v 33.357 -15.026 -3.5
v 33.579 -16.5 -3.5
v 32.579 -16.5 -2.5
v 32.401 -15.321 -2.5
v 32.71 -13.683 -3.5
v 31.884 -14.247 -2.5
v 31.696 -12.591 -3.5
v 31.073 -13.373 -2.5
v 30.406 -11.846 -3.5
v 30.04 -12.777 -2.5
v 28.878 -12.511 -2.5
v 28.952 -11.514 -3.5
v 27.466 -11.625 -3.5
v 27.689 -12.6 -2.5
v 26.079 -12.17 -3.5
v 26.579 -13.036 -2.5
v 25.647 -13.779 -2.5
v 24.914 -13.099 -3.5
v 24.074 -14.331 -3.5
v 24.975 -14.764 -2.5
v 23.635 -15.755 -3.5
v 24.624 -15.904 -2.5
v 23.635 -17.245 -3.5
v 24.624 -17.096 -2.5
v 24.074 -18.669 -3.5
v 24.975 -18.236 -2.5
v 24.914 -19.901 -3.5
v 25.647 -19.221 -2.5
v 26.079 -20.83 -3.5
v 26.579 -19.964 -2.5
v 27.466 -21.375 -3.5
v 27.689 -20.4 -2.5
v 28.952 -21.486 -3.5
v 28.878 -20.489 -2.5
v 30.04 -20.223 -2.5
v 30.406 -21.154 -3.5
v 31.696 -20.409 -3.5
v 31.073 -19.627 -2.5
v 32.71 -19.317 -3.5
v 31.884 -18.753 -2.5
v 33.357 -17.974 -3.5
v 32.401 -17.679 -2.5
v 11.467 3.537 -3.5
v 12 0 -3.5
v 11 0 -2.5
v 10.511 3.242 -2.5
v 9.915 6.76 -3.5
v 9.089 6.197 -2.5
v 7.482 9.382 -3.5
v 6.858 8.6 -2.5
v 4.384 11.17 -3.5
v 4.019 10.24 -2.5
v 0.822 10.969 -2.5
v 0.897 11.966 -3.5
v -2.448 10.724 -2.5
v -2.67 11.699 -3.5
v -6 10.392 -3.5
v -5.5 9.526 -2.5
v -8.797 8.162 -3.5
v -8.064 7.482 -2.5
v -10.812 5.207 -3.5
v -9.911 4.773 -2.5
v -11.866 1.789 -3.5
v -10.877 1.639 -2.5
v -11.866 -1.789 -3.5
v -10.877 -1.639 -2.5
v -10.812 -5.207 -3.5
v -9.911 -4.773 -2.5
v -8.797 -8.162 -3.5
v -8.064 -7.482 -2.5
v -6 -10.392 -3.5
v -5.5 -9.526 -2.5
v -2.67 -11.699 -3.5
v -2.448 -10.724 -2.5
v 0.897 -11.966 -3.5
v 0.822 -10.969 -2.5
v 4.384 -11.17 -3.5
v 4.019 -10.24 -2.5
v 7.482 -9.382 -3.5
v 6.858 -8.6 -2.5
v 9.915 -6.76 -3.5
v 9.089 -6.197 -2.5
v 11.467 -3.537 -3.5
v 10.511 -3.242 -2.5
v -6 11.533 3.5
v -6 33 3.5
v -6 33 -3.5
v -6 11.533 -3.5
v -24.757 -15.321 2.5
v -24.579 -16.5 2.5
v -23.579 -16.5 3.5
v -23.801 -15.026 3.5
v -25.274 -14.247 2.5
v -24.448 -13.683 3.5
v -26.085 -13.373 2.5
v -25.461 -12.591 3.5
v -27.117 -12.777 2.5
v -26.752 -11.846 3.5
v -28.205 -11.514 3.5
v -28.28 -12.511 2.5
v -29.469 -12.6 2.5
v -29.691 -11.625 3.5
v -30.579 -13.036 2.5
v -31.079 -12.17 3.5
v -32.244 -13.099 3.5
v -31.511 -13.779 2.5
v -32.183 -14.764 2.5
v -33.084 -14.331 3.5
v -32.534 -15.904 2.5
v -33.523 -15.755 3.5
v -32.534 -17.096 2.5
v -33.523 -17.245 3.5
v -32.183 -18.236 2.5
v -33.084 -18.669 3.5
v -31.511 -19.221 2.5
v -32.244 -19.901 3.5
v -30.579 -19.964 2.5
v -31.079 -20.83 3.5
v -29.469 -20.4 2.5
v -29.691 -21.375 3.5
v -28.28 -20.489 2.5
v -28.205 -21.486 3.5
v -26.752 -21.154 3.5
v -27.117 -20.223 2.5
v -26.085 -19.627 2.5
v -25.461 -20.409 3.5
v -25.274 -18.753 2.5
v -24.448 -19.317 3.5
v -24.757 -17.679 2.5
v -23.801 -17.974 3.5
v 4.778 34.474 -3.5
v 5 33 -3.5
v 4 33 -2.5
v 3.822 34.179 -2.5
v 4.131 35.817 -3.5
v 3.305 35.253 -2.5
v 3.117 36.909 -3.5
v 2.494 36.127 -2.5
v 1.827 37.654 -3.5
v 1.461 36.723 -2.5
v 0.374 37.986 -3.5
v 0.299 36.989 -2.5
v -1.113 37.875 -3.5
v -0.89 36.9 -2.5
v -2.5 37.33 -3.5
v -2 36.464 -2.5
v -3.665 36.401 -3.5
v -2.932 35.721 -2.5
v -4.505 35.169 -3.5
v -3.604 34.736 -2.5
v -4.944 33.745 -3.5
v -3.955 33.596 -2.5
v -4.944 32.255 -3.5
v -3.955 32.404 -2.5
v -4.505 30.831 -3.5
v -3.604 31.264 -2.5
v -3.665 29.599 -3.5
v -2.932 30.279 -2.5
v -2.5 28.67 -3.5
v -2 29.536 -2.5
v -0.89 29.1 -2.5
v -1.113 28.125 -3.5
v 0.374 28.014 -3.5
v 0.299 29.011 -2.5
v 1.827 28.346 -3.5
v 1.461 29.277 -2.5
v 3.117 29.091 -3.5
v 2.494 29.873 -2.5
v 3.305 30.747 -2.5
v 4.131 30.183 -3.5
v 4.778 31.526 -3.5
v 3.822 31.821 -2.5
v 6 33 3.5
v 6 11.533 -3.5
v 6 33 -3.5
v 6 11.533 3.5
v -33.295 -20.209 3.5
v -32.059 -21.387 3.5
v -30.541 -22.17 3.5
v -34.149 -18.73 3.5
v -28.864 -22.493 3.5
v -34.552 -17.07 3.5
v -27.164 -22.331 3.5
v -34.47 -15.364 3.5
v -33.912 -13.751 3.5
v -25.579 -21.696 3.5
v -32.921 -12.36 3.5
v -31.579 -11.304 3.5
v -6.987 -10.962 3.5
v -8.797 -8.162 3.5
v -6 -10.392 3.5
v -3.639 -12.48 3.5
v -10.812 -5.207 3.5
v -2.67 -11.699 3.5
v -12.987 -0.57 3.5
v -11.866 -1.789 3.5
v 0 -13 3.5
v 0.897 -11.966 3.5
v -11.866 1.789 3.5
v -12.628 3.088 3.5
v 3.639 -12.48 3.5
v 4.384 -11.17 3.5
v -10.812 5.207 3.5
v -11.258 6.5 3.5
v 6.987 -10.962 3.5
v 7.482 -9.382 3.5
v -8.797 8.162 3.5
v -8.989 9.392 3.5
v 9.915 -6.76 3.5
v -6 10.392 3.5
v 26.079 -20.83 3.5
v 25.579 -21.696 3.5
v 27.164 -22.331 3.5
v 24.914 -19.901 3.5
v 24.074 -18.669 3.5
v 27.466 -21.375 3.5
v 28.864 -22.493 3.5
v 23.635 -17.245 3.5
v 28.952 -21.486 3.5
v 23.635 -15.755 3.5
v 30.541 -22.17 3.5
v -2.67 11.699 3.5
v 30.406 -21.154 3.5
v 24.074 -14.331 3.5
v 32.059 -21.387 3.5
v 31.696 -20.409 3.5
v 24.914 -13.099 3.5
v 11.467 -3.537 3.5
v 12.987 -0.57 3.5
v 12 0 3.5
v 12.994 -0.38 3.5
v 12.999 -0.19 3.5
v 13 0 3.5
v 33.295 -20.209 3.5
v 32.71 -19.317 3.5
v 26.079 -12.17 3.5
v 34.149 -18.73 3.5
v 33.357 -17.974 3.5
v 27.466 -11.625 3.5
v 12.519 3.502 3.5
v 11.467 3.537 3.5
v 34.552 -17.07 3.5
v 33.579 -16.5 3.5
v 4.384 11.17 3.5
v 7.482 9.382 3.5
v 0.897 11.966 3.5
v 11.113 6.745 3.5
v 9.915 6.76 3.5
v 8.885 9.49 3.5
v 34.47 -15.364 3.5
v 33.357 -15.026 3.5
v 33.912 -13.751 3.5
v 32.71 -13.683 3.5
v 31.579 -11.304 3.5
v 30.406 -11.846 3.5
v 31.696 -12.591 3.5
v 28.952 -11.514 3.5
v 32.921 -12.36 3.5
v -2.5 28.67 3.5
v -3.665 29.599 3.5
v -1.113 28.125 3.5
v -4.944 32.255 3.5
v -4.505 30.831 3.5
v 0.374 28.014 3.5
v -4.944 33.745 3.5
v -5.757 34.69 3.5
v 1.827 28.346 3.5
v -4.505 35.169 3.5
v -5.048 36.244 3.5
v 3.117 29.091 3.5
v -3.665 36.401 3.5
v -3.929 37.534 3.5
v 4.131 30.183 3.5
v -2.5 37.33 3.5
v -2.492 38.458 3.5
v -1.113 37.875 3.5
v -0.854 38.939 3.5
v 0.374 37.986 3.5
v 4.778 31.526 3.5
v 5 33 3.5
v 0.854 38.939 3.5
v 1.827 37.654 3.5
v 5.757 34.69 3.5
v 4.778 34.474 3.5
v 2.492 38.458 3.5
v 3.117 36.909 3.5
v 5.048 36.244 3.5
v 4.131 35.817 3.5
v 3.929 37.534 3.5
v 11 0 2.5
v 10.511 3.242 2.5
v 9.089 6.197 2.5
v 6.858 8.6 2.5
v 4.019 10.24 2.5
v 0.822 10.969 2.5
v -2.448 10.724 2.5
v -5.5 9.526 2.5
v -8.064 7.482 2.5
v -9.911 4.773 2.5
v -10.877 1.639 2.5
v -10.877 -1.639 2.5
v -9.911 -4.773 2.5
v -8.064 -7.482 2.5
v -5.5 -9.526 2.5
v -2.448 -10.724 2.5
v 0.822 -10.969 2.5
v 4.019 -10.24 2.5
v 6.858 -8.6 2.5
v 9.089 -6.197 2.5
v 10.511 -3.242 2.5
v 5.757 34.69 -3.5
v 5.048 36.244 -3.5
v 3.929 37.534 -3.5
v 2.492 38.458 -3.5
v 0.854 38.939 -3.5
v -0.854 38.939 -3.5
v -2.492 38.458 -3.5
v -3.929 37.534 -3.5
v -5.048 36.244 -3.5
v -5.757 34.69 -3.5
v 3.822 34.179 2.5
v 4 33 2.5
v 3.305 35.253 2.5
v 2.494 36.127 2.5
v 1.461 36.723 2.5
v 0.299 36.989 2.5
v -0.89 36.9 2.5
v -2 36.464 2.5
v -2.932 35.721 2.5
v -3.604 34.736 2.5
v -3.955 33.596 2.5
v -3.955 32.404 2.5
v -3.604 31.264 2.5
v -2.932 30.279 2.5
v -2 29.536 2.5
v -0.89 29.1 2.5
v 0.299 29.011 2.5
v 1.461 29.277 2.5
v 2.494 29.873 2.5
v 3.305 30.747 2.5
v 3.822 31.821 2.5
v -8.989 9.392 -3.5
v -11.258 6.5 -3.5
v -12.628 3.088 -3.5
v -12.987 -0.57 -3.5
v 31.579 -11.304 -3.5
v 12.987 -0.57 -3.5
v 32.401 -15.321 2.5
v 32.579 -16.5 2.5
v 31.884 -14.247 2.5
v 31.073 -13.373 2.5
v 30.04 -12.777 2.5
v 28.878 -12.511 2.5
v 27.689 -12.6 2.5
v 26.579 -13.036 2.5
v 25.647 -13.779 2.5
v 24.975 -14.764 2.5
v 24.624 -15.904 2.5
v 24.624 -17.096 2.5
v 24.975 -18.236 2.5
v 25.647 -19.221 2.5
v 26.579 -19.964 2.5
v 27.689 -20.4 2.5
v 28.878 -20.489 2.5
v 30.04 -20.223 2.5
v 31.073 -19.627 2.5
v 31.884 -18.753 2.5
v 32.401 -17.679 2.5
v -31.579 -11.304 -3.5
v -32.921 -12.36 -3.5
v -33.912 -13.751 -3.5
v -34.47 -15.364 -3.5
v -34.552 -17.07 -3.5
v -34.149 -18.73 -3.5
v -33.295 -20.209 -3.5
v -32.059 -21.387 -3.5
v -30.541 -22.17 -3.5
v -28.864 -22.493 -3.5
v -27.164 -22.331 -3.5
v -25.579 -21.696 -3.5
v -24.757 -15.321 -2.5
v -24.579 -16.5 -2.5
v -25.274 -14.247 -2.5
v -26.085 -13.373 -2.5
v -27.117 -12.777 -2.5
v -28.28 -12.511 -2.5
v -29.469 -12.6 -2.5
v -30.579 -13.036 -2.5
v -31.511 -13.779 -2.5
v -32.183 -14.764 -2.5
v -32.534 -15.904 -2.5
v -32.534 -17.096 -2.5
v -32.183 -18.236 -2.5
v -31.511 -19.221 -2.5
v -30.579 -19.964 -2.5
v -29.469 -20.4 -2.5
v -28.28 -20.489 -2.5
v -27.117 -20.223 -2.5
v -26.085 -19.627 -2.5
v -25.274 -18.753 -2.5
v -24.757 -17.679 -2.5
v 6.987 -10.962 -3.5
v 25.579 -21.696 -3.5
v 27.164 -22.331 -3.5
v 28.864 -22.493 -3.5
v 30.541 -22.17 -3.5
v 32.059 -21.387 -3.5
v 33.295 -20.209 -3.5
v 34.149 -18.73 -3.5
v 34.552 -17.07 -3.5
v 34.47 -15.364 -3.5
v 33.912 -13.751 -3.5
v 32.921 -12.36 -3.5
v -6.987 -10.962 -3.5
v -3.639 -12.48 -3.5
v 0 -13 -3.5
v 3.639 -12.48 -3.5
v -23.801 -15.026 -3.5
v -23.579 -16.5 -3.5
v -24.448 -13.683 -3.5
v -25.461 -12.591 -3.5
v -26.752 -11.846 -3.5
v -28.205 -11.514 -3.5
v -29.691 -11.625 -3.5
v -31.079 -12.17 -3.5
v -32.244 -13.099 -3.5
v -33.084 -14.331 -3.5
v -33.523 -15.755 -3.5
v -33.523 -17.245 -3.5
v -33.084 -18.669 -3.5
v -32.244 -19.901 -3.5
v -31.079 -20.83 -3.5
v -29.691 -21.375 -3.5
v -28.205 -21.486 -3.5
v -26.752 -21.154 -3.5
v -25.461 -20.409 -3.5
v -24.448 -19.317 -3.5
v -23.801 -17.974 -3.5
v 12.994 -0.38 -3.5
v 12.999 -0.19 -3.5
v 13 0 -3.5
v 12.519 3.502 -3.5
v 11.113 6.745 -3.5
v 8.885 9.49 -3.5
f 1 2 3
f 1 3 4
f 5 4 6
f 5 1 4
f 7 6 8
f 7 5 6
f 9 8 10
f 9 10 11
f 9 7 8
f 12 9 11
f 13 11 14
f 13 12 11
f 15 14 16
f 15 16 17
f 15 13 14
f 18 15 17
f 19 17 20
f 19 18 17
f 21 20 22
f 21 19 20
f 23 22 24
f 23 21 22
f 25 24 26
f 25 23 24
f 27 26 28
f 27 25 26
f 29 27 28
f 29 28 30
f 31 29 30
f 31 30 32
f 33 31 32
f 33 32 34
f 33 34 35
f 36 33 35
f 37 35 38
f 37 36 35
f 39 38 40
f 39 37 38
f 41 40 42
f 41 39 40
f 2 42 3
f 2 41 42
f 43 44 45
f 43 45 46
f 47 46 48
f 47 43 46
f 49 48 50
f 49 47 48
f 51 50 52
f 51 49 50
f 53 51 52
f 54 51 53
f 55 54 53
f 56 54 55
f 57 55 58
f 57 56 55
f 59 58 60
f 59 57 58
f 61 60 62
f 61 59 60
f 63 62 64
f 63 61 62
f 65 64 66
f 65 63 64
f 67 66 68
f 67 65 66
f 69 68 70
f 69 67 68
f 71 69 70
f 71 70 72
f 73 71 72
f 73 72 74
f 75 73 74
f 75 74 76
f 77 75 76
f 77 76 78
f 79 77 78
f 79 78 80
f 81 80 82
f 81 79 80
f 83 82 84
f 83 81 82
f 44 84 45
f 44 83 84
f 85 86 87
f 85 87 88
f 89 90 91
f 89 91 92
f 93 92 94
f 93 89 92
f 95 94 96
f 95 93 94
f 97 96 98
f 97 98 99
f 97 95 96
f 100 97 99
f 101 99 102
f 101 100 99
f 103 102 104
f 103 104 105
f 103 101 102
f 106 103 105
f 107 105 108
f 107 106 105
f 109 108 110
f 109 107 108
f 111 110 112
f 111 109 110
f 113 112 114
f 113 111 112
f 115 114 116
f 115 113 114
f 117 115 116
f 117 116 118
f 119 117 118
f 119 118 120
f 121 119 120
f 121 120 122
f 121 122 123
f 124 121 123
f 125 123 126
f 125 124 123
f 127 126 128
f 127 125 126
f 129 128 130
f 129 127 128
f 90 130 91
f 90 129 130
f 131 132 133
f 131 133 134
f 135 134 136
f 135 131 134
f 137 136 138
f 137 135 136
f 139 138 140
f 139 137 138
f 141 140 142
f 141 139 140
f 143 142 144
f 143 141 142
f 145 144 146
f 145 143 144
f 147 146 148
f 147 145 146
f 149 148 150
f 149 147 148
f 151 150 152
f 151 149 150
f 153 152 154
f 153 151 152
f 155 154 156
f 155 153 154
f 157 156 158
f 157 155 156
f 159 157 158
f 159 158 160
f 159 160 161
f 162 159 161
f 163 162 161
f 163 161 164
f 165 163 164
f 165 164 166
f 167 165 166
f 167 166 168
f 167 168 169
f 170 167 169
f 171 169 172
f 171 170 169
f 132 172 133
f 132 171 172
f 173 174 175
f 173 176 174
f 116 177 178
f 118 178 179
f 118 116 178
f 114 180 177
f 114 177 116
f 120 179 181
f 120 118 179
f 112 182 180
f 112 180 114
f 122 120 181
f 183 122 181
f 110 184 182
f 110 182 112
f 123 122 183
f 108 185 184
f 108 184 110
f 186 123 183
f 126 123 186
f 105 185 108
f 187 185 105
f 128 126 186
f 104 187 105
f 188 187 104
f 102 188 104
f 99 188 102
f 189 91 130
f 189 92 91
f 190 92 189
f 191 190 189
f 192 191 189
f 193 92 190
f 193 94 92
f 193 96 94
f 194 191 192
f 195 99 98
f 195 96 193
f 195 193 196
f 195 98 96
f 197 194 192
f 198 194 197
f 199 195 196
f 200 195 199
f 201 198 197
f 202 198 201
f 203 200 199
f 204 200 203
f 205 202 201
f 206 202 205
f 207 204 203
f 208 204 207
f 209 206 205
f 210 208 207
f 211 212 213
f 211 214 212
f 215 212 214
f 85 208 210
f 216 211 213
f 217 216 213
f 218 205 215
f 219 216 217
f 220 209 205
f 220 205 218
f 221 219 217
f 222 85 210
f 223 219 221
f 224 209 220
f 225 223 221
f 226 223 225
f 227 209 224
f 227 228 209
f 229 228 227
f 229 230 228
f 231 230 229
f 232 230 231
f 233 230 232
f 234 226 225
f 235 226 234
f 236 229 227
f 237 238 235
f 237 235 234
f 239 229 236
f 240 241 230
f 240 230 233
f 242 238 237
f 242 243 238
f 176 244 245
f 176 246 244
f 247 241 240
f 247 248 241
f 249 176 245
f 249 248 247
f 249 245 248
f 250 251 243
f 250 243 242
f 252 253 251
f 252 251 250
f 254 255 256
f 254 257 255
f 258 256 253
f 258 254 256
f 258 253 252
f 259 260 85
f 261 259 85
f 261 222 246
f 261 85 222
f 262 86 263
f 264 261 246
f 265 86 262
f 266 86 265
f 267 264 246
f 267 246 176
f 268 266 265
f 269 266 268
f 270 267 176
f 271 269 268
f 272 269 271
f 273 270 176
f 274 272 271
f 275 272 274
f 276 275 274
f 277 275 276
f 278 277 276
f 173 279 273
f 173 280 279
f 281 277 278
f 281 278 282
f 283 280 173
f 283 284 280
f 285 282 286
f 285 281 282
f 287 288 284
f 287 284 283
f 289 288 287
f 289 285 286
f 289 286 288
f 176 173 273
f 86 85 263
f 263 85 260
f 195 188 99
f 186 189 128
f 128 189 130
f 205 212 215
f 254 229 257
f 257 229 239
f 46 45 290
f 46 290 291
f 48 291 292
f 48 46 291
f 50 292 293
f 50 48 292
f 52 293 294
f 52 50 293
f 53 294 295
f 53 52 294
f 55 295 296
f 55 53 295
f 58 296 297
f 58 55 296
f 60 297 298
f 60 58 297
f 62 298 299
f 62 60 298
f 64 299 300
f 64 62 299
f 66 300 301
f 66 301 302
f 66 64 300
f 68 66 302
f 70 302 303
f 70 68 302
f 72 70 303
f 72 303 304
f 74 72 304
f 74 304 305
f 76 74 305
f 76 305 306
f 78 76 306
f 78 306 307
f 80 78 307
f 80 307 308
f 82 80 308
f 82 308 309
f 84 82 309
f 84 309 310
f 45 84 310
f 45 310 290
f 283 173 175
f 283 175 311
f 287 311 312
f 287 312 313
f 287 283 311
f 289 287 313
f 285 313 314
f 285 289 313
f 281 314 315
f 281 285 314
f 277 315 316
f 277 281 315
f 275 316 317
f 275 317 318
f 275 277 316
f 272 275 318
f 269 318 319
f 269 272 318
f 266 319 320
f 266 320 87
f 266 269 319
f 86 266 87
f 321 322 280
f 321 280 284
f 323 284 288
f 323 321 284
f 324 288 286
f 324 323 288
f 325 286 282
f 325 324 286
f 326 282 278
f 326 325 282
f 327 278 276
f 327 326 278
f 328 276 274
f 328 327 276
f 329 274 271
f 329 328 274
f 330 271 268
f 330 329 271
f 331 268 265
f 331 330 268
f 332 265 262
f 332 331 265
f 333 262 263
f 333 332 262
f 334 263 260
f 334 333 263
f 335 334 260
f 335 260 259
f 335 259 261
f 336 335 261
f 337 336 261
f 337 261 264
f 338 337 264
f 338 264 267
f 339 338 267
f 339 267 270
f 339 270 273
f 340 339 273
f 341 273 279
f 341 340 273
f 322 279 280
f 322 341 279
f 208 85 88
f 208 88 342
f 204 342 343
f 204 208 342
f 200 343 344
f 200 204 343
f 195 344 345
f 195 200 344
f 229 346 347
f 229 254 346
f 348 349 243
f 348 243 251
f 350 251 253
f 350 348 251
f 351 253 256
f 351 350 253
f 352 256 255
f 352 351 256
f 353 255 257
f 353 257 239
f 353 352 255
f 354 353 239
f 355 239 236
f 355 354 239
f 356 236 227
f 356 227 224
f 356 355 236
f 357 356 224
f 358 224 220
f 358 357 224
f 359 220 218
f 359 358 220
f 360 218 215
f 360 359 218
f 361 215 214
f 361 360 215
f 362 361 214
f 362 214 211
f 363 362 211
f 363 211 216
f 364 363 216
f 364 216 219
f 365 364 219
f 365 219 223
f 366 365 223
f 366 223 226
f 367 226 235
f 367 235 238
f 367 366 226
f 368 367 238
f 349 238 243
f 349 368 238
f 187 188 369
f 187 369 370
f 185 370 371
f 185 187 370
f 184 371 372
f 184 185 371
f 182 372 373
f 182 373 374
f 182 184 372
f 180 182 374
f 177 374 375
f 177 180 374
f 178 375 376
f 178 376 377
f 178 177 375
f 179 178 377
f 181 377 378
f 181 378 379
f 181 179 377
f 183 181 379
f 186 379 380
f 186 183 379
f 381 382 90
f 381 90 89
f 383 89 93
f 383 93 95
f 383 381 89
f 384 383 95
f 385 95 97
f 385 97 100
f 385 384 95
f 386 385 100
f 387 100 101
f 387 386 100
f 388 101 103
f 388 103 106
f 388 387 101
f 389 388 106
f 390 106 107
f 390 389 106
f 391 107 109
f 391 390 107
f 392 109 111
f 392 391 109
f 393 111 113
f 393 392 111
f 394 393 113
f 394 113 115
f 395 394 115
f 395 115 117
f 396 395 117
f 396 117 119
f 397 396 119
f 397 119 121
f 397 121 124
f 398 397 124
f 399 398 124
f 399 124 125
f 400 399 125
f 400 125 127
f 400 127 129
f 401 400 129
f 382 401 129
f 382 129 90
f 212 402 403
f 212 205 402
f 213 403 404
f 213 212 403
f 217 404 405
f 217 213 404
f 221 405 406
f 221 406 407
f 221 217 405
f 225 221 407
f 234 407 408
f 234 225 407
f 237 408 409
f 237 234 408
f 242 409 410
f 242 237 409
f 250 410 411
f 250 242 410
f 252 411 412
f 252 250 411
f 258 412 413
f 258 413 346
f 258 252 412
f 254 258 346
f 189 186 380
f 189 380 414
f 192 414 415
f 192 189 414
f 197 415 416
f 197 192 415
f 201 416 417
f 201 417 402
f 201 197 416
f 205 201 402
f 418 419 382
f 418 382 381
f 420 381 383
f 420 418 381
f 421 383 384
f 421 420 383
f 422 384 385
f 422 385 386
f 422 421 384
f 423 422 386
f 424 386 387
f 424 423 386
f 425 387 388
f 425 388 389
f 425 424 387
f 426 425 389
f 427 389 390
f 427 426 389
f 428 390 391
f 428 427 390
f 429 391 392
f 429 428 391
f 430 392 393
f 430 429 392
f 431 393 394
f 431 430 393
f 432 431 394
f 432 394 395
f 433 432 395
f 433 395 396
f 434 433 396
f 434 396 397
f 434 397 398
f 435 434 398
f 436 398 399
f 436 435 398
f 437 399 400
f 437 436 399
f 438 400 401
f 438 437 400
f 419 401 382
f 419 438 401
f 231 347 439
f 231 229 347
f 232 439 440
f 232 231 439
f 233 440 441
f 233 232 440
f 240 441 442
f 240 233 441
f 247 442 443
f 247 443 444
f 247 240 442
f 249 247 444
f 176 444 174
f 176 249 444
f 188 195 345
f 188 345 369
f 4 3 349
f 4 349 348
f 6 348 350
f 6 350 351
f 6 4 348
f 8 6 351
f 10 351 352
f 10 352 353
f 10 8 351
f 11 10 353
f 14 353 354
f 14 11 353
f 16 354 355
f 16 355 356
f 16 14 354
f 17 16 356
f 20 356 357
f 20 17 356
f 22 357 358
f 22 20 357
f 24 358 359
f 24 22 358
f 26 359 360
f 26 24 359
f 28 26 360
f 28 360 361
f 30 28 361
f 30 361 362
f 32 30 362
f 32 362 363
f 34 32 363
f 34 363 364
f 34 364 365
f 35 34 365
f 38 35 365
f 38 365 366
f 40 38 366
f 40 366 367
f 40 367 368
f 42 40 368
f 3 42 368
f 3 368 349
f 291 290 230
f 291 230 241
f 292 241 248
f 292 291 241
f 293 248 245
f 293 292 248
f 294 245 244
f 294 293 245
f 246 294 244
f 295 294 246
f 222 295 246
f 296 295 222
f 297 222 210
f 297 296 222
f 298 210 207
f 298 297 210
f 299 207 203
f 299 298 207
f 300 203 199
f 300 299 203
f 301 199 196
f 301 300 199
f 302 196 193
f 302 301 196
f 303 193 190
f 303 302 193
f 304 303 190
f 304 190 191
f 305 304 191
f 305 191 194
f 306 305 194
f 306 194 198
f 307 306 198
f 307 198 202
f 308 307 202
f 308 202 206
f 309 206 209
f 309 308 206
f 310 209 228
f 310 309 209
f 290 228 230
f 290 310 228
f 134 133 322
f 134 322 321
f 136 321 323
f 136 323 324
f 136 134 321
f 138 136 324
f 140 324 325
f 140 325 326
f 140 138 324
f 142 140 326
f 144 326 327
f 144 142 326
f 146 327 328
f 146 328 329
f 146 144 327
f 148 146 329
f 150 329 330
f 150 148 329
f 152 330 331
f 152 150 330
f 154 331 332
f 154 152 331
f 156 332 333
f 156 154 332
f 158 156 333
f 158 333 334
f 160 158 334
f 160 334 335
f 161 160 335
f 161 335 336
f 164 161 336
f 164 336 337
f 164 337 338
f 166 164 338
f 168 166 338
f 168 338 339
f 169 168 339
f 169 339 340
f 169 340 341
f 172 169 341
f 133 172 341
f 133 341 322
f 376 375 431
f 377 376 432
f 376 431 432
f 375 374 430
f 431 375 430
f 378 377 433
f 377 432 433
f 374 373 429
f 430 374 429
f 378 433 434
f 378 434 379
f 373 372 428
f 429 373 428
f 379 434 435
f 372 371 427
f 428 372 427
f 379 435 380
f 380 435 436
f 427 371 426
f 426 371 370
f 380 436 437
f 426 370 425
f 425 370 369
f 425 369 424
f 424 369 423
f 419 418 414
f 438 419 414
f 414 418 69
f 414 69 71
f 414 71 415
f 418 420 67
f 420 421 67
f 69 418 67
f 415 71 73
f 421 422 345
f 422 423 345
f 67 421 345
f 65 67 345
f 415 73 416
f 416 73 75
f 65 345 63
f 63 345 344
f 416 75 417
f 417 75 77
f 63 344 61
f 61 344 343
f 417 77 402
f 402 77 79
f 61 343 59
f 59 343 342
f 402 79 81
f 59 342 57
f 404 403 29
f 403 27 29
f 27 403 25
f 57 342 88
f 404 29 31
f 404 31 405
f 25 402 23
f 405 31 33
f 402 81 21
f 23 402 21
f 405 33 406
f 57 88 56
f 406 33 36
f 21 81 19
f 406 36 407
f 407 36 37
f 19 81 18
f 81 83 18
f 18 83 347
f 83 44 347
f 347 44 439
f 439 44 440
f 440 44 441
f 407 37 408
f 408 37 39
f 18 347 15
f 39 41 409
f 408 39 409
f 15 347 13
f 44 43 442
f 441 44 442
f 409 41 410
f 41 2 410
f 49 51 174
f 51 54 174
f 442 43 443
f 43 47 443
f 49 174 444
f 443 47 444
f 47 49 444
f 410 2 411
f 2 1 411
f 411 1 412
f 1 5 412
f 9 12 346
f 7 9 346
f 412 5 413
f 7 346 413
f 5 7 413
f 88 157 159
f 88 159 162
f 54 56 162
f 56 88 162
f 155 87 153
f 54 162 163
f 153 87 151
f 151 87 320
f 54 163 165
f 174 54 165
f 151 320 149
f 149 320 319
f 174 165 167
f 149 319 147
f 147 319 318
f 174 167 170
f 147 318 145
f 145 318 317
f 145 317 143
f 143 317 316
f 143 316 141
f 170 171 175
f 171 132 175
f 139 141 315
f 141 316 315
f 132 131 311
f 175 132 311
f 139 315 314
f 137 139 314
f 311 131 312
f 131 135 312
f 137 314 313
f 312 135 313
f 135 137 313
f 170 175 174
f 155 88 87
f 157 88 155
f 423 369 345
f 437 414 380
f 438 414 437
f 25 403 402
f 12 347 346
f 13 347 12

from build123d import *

# Parameters (mm, degrees)
F0_R     = 11
F0_R_2   = 4
F1_DEPTH = 3.5
F2_SIZE  = 1


# Not quite as in the source:
# - a feature names something its author has since deleted; it is built from what else it names


with BuildPart() as f1:
    # F0 (on Top) → F1 (new body, symmetric)
    with BuildSketch(Plane.XY):
        with BuildLine():
            ThreePointArc((-6, 11.5325625947), (0, 13), (6, 11.5325625947))
            Line((6, 11.5325625947), (6, 33))
            ThreePointArc((6, 33), (0, 27), (-6, 33))
            Line((-6, 33), (-6, 11.5325625947))
        make_face()
        with BuildLine():
            ThreePointArc((-6.9874921777, -10.96243372), (-11.2583302492, -6.5), (-12.9874921777, -0.5701288746))
            Line((-12.9874921777, -0.5701288746), (-31.5788383249, -11.3038475773))
            ThreePointArc((-31.5788383249, -11.3038475773), (-25.5788383249, -11.3038475773), (-22.5788383249, -16.5))
            ThreePointArc((-22.5788383249, -16.5), (-23.3826859022, -19.5), (-25.5788383249, -21.6961524227))
            Line((-25.5788383249, -21.6961524227), (-6.9874921777, -10.96243372))
        make_face()
        with BuildLine():
            Line((31.5788383249, -11.3038475773), (12.9874921777, -0.5701288746))
            ThreePointArc((12.9874921777, -0.5701288746), (11.2583302492, -6.5), (6.9874921777, -10.96243372))
            Line((6.9874921777, -10.96243372), (25.5788383249, -21.6961524227))
            ThreePointArc((25.5788383249, -21.6961524227), (23.3826859022, -13.5), (31.5788383249, -11.3038475773))
        make_face()
        with BuildLine():
            ThreePointArc((12.9874921777, -0.5701288746), (12.9968726683, -0.2851330301), (13, 0))
            ThreePointArc((13, 0), (11.1130553854, 6.7453687816), (6, 11.5325625947))
            ThreePointArc((6, 11.5325625947), (0, 13), (-6, 11.5325625947))
            ThreePointArc((-6, 11.5325625947), (-11.2583302492, 6.5), (-12.9874921777, -0.5701288746))
            ThreePointArc((-12.9874921777, -0.5701288746), (-11.2583302492, -6.5), (-6.9874921777, -10.96243372))
            ThreePointArc((-6.9874921777, -10.96243372), (0, -13), (6.9874921777, -10.96243372))
            ThreePointArc((6.9874921777, -10.96243372), (11.2583302492, -6.5), (12.9874921777, -0.5701288746))
        make_face()
        Circle(F0_R, mode=Mode.SUBTRACT)
        with BuildLine():
            ThreePointArc((-6, 33), (0, 27), (6, 33))
            ThreePointArc((6, 33), (0, 39), (-6, 33))
        make_face()
        with Locations((0, 33)):
            Circle(F0_R_2, mode=Mode.SUBTRACT)
        with BuildLine():
            ThreePointArc((-22.5788383249, -16.5), (-25.5788383249, -11.3038475773), (-31.5788383249, -11.3038475773))
            ThreePointArc((-31.5788383249, -11.3038475773), (-33.7749907476, -19.5), (-25.5788383249, -21.6961524227))
            ThreePointArc((-25.5788383249, -21.6961524227), (-23.3826859022, -19.5), (-22.5788383249, -16.5))
        make_face()
        with Locations((-28.5788383249, -16.5)):
            Circle(F0_R_2, mode=Mode.SUBTRACT)
        with BuildLine():
            ThreePointArc((34.5788383249, -16.5), (33.7749907476, -13.5), (31.5788383249, -11.3038475773))
            ThreePointArc((31.5788383249, -11.3038475773), (23.3826859022, -13.5), (25.5788383249, -21.6961524227))
            ThreePointArc((25.5788383249, -21.6961524227), (31.5788383249, -21.6961524227), (34.5788383249, -16.5))
        make_face()
        with Locations((28.5788383249, -16.5)):
            Circle(F0_R_2, mode=Mode.SUBTRACT)
    extrude(amount=F1_DEPTH, both=True)

    # F2
    f2_edges = [f1.edges().sort_by_distance(p)[0] for p in [
        (-4, 33, 3.5),
        (-11, 0, 3.5),
        (-32.578838, -16.5, 3.5),
        (24.578838, -16.5, 3.5),
        (-32.578838, -16.5, -3.5),
        (-11, 0, -3.5),
        (24.578838, -16.5, -3.5),
        (-4, 33, -3.5),
    ]]
    chamfer(f2_edges, length=F2_SIZE)


solid = f1.part
